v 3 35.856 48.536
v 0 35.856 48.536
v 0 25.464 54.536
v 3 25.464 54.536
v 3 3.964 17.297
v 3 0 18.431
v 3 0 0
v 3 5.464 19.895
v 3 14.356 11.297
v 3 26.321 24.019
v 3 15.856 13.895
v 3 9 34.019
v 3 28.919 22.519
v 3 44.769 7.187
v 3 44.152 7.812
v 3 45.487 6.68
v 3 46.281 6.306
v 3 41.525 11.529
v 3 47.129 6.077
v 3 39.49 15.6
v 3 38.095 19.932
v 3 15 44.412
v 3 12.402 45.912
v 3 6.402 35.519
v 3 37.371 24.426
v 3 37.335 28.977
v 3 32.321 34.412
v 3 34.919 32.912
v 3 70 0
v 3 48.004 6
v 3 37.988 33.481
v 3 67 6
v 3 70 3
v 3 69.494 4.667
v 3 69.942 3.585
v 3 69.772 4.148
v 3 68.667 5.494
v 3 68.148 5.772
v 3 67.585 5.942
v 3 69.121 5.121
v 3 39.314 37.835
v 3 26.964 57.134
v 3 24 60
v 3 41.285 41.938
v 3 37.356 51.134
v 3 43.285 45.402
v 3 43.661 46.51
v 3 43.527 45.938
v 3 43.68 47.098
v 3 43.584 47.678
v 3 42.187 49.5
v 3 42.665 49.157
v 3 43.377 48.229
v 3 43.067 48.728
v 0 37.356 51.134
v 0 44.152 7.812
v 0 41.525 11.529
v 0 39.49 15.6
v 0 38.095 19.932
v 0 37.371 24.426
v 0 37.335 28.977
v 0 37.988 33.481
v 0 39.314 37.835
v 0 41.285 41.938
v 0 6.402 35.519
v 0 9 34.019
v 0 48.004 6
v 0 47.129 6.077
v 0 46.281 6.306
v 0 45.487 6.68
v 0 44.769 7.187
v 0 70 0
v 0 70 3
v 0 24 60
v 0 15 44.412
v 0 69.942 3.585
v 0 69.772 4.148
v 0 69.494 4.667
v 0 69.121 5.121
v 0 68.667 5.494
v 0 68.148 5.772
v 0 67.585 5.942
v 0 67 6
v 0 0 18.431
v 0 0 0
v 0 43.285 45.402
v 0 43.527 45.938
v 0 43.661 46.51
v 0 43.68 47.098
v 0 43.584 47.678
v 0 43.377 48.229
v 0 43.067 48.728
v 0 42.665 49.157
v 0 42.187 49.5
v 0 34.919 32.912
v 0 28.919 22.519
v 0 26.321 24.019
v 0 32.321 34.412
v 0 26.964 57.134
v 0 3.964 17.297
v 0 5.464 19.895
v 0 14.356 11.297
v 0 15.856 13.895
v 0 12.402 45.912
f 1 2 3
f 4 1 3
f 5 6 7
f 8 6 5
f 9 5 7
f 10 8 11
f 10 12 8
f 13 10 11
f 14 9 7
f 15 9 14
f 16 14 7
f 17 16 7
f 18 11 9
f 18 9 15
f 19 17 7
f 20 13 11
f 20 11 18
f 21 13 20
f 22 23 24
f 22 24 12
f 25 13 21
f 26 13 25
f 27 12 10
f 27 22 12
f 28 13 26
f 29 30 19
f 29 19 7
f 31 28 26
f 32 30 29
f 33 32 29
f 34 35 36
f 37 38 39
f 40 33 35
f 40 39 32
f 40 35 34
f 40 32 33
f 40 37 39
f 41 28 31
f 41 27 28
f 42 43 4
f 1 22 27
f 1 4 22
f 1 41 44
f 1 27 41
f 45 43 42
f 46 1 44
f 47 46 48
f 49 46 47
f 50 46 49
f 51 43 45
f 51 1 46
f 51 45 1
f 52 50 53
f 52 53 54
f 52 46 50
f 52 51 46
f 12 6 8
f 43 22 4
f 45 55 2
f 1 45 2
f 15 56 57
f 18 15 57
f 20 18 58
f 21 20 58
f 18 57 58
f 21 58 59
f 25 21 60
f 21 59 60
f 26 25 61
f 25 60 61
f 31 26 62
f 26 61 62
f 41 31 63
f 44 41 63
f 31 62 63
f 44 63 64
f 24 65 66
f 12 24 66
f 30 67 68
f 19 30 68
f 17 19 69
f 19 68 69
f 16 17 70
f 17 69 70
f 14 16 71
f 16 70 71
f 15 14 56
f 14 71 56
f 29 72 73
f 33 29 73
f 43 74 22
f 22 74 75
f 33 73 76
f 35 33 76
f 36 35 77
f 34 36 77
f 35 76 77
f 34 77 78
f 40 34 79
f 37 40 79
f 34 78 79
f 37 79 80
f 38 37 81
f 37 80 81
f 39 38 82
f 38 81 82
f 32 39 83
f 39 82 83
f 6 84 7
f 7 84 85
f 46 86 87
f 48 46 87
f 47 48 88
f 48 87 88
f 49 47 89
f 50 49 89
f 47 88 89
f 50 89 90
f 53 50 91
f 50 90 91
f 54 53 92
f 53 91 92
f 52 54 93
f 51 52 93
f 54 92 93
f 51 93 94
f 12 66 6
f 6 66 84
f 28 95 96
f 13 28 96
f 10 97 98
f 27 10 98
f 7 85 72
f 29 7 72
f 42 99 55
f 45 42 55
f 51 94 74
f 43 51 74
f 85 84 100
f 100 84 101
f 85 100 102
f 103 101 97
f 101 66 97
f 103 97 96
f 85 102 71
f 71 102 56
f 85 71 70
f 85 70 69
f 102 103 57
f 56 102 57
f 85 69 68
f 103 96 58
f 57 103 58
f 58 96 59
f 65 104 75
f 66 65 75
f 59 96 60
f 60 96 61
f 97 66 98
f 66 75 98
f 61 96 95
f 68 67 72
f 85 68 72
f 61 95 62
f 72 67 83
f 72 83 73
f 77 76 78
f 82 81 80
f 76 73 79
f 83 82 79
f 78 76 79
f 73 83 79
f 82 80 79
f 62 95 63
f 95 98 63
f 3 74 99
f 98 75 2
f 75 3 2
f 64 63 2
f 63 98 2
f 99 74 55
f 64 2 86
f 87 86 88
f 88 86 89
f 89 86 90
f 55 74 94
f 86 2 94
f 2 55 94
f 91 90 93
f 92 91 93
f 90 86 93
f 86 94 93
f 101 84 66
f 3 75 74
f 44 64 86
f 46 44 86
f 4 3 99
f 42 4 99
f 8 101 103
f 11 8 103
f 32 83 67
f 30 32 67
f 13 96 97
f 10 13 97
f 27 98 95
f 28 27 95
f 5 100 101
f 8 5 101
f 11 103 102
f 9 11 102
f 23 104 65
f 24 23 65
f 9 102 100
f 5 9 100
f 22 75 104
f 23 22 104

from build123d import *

# Parameters (mm, degrees)
F1_DEPTH = 3


with BuildPart() as f1:
    # F0 (on Right) → F1 (new body)
    with BuildSketch(Plane.YZ):
        with BuildLine():
            Line((9, 34.019238), (0, 18.430781))
            Line((0, 18.430781), (0, 0))
            Line((0, 0), (70, 0))
            Line((70, 0), (70, 3))
            ThreePointArc((70, 3), (69.12132, 5.12132), (67, 6))
            Line((67, 6), (48.00438, 6))
            ThreePointArc((48.00438, 6), (45.875744, 6.475742), (44.152181, 7.812436))
            ThreePointArc((44.152181, 7.812436), (37.370731, 24.425762), (41.28461, 41.937822))
            Line((41.28461, 41.937822), (43.28461, 45.401924))
            ThreePointArc((43.28461, 45.401924), (43.584311, 47.678381), (42.186533, 49.5))
            Line((42.186533, 49.5), (24, 60))
            Line((24, 60), (15, 44.411543))
            Line((15, 44.411543), (12.401924, 45.911543))
            Line((12.401924, 45.911543), (6.401924, 35.519238))
            Line((6.401924, 35.519238), (9, 34.019238))
        make_face()
        Polygon((3.964102, 17.296806), (5.464102, 19.894882), (15.856406, 13.894882), (14.356406, 11.296806), align=None, mode=Mode.SUBTRACT)
        Polygon((26.320508, 24.019238), (32.320508, 34.411543), (34.918584, 32.911543), (28.918584, 22.519238), align=None, mode=Mode.SUBTRACT)
        Polygon((25.464102, 54.535898), (26.964102, 57.133975), (37.356406, 51.133975), (35.856406, 48.535898), align=None, mode=Mode.SUBTRACT)
    extrude(amount=F1_DEPTH)


solid = f1.part
